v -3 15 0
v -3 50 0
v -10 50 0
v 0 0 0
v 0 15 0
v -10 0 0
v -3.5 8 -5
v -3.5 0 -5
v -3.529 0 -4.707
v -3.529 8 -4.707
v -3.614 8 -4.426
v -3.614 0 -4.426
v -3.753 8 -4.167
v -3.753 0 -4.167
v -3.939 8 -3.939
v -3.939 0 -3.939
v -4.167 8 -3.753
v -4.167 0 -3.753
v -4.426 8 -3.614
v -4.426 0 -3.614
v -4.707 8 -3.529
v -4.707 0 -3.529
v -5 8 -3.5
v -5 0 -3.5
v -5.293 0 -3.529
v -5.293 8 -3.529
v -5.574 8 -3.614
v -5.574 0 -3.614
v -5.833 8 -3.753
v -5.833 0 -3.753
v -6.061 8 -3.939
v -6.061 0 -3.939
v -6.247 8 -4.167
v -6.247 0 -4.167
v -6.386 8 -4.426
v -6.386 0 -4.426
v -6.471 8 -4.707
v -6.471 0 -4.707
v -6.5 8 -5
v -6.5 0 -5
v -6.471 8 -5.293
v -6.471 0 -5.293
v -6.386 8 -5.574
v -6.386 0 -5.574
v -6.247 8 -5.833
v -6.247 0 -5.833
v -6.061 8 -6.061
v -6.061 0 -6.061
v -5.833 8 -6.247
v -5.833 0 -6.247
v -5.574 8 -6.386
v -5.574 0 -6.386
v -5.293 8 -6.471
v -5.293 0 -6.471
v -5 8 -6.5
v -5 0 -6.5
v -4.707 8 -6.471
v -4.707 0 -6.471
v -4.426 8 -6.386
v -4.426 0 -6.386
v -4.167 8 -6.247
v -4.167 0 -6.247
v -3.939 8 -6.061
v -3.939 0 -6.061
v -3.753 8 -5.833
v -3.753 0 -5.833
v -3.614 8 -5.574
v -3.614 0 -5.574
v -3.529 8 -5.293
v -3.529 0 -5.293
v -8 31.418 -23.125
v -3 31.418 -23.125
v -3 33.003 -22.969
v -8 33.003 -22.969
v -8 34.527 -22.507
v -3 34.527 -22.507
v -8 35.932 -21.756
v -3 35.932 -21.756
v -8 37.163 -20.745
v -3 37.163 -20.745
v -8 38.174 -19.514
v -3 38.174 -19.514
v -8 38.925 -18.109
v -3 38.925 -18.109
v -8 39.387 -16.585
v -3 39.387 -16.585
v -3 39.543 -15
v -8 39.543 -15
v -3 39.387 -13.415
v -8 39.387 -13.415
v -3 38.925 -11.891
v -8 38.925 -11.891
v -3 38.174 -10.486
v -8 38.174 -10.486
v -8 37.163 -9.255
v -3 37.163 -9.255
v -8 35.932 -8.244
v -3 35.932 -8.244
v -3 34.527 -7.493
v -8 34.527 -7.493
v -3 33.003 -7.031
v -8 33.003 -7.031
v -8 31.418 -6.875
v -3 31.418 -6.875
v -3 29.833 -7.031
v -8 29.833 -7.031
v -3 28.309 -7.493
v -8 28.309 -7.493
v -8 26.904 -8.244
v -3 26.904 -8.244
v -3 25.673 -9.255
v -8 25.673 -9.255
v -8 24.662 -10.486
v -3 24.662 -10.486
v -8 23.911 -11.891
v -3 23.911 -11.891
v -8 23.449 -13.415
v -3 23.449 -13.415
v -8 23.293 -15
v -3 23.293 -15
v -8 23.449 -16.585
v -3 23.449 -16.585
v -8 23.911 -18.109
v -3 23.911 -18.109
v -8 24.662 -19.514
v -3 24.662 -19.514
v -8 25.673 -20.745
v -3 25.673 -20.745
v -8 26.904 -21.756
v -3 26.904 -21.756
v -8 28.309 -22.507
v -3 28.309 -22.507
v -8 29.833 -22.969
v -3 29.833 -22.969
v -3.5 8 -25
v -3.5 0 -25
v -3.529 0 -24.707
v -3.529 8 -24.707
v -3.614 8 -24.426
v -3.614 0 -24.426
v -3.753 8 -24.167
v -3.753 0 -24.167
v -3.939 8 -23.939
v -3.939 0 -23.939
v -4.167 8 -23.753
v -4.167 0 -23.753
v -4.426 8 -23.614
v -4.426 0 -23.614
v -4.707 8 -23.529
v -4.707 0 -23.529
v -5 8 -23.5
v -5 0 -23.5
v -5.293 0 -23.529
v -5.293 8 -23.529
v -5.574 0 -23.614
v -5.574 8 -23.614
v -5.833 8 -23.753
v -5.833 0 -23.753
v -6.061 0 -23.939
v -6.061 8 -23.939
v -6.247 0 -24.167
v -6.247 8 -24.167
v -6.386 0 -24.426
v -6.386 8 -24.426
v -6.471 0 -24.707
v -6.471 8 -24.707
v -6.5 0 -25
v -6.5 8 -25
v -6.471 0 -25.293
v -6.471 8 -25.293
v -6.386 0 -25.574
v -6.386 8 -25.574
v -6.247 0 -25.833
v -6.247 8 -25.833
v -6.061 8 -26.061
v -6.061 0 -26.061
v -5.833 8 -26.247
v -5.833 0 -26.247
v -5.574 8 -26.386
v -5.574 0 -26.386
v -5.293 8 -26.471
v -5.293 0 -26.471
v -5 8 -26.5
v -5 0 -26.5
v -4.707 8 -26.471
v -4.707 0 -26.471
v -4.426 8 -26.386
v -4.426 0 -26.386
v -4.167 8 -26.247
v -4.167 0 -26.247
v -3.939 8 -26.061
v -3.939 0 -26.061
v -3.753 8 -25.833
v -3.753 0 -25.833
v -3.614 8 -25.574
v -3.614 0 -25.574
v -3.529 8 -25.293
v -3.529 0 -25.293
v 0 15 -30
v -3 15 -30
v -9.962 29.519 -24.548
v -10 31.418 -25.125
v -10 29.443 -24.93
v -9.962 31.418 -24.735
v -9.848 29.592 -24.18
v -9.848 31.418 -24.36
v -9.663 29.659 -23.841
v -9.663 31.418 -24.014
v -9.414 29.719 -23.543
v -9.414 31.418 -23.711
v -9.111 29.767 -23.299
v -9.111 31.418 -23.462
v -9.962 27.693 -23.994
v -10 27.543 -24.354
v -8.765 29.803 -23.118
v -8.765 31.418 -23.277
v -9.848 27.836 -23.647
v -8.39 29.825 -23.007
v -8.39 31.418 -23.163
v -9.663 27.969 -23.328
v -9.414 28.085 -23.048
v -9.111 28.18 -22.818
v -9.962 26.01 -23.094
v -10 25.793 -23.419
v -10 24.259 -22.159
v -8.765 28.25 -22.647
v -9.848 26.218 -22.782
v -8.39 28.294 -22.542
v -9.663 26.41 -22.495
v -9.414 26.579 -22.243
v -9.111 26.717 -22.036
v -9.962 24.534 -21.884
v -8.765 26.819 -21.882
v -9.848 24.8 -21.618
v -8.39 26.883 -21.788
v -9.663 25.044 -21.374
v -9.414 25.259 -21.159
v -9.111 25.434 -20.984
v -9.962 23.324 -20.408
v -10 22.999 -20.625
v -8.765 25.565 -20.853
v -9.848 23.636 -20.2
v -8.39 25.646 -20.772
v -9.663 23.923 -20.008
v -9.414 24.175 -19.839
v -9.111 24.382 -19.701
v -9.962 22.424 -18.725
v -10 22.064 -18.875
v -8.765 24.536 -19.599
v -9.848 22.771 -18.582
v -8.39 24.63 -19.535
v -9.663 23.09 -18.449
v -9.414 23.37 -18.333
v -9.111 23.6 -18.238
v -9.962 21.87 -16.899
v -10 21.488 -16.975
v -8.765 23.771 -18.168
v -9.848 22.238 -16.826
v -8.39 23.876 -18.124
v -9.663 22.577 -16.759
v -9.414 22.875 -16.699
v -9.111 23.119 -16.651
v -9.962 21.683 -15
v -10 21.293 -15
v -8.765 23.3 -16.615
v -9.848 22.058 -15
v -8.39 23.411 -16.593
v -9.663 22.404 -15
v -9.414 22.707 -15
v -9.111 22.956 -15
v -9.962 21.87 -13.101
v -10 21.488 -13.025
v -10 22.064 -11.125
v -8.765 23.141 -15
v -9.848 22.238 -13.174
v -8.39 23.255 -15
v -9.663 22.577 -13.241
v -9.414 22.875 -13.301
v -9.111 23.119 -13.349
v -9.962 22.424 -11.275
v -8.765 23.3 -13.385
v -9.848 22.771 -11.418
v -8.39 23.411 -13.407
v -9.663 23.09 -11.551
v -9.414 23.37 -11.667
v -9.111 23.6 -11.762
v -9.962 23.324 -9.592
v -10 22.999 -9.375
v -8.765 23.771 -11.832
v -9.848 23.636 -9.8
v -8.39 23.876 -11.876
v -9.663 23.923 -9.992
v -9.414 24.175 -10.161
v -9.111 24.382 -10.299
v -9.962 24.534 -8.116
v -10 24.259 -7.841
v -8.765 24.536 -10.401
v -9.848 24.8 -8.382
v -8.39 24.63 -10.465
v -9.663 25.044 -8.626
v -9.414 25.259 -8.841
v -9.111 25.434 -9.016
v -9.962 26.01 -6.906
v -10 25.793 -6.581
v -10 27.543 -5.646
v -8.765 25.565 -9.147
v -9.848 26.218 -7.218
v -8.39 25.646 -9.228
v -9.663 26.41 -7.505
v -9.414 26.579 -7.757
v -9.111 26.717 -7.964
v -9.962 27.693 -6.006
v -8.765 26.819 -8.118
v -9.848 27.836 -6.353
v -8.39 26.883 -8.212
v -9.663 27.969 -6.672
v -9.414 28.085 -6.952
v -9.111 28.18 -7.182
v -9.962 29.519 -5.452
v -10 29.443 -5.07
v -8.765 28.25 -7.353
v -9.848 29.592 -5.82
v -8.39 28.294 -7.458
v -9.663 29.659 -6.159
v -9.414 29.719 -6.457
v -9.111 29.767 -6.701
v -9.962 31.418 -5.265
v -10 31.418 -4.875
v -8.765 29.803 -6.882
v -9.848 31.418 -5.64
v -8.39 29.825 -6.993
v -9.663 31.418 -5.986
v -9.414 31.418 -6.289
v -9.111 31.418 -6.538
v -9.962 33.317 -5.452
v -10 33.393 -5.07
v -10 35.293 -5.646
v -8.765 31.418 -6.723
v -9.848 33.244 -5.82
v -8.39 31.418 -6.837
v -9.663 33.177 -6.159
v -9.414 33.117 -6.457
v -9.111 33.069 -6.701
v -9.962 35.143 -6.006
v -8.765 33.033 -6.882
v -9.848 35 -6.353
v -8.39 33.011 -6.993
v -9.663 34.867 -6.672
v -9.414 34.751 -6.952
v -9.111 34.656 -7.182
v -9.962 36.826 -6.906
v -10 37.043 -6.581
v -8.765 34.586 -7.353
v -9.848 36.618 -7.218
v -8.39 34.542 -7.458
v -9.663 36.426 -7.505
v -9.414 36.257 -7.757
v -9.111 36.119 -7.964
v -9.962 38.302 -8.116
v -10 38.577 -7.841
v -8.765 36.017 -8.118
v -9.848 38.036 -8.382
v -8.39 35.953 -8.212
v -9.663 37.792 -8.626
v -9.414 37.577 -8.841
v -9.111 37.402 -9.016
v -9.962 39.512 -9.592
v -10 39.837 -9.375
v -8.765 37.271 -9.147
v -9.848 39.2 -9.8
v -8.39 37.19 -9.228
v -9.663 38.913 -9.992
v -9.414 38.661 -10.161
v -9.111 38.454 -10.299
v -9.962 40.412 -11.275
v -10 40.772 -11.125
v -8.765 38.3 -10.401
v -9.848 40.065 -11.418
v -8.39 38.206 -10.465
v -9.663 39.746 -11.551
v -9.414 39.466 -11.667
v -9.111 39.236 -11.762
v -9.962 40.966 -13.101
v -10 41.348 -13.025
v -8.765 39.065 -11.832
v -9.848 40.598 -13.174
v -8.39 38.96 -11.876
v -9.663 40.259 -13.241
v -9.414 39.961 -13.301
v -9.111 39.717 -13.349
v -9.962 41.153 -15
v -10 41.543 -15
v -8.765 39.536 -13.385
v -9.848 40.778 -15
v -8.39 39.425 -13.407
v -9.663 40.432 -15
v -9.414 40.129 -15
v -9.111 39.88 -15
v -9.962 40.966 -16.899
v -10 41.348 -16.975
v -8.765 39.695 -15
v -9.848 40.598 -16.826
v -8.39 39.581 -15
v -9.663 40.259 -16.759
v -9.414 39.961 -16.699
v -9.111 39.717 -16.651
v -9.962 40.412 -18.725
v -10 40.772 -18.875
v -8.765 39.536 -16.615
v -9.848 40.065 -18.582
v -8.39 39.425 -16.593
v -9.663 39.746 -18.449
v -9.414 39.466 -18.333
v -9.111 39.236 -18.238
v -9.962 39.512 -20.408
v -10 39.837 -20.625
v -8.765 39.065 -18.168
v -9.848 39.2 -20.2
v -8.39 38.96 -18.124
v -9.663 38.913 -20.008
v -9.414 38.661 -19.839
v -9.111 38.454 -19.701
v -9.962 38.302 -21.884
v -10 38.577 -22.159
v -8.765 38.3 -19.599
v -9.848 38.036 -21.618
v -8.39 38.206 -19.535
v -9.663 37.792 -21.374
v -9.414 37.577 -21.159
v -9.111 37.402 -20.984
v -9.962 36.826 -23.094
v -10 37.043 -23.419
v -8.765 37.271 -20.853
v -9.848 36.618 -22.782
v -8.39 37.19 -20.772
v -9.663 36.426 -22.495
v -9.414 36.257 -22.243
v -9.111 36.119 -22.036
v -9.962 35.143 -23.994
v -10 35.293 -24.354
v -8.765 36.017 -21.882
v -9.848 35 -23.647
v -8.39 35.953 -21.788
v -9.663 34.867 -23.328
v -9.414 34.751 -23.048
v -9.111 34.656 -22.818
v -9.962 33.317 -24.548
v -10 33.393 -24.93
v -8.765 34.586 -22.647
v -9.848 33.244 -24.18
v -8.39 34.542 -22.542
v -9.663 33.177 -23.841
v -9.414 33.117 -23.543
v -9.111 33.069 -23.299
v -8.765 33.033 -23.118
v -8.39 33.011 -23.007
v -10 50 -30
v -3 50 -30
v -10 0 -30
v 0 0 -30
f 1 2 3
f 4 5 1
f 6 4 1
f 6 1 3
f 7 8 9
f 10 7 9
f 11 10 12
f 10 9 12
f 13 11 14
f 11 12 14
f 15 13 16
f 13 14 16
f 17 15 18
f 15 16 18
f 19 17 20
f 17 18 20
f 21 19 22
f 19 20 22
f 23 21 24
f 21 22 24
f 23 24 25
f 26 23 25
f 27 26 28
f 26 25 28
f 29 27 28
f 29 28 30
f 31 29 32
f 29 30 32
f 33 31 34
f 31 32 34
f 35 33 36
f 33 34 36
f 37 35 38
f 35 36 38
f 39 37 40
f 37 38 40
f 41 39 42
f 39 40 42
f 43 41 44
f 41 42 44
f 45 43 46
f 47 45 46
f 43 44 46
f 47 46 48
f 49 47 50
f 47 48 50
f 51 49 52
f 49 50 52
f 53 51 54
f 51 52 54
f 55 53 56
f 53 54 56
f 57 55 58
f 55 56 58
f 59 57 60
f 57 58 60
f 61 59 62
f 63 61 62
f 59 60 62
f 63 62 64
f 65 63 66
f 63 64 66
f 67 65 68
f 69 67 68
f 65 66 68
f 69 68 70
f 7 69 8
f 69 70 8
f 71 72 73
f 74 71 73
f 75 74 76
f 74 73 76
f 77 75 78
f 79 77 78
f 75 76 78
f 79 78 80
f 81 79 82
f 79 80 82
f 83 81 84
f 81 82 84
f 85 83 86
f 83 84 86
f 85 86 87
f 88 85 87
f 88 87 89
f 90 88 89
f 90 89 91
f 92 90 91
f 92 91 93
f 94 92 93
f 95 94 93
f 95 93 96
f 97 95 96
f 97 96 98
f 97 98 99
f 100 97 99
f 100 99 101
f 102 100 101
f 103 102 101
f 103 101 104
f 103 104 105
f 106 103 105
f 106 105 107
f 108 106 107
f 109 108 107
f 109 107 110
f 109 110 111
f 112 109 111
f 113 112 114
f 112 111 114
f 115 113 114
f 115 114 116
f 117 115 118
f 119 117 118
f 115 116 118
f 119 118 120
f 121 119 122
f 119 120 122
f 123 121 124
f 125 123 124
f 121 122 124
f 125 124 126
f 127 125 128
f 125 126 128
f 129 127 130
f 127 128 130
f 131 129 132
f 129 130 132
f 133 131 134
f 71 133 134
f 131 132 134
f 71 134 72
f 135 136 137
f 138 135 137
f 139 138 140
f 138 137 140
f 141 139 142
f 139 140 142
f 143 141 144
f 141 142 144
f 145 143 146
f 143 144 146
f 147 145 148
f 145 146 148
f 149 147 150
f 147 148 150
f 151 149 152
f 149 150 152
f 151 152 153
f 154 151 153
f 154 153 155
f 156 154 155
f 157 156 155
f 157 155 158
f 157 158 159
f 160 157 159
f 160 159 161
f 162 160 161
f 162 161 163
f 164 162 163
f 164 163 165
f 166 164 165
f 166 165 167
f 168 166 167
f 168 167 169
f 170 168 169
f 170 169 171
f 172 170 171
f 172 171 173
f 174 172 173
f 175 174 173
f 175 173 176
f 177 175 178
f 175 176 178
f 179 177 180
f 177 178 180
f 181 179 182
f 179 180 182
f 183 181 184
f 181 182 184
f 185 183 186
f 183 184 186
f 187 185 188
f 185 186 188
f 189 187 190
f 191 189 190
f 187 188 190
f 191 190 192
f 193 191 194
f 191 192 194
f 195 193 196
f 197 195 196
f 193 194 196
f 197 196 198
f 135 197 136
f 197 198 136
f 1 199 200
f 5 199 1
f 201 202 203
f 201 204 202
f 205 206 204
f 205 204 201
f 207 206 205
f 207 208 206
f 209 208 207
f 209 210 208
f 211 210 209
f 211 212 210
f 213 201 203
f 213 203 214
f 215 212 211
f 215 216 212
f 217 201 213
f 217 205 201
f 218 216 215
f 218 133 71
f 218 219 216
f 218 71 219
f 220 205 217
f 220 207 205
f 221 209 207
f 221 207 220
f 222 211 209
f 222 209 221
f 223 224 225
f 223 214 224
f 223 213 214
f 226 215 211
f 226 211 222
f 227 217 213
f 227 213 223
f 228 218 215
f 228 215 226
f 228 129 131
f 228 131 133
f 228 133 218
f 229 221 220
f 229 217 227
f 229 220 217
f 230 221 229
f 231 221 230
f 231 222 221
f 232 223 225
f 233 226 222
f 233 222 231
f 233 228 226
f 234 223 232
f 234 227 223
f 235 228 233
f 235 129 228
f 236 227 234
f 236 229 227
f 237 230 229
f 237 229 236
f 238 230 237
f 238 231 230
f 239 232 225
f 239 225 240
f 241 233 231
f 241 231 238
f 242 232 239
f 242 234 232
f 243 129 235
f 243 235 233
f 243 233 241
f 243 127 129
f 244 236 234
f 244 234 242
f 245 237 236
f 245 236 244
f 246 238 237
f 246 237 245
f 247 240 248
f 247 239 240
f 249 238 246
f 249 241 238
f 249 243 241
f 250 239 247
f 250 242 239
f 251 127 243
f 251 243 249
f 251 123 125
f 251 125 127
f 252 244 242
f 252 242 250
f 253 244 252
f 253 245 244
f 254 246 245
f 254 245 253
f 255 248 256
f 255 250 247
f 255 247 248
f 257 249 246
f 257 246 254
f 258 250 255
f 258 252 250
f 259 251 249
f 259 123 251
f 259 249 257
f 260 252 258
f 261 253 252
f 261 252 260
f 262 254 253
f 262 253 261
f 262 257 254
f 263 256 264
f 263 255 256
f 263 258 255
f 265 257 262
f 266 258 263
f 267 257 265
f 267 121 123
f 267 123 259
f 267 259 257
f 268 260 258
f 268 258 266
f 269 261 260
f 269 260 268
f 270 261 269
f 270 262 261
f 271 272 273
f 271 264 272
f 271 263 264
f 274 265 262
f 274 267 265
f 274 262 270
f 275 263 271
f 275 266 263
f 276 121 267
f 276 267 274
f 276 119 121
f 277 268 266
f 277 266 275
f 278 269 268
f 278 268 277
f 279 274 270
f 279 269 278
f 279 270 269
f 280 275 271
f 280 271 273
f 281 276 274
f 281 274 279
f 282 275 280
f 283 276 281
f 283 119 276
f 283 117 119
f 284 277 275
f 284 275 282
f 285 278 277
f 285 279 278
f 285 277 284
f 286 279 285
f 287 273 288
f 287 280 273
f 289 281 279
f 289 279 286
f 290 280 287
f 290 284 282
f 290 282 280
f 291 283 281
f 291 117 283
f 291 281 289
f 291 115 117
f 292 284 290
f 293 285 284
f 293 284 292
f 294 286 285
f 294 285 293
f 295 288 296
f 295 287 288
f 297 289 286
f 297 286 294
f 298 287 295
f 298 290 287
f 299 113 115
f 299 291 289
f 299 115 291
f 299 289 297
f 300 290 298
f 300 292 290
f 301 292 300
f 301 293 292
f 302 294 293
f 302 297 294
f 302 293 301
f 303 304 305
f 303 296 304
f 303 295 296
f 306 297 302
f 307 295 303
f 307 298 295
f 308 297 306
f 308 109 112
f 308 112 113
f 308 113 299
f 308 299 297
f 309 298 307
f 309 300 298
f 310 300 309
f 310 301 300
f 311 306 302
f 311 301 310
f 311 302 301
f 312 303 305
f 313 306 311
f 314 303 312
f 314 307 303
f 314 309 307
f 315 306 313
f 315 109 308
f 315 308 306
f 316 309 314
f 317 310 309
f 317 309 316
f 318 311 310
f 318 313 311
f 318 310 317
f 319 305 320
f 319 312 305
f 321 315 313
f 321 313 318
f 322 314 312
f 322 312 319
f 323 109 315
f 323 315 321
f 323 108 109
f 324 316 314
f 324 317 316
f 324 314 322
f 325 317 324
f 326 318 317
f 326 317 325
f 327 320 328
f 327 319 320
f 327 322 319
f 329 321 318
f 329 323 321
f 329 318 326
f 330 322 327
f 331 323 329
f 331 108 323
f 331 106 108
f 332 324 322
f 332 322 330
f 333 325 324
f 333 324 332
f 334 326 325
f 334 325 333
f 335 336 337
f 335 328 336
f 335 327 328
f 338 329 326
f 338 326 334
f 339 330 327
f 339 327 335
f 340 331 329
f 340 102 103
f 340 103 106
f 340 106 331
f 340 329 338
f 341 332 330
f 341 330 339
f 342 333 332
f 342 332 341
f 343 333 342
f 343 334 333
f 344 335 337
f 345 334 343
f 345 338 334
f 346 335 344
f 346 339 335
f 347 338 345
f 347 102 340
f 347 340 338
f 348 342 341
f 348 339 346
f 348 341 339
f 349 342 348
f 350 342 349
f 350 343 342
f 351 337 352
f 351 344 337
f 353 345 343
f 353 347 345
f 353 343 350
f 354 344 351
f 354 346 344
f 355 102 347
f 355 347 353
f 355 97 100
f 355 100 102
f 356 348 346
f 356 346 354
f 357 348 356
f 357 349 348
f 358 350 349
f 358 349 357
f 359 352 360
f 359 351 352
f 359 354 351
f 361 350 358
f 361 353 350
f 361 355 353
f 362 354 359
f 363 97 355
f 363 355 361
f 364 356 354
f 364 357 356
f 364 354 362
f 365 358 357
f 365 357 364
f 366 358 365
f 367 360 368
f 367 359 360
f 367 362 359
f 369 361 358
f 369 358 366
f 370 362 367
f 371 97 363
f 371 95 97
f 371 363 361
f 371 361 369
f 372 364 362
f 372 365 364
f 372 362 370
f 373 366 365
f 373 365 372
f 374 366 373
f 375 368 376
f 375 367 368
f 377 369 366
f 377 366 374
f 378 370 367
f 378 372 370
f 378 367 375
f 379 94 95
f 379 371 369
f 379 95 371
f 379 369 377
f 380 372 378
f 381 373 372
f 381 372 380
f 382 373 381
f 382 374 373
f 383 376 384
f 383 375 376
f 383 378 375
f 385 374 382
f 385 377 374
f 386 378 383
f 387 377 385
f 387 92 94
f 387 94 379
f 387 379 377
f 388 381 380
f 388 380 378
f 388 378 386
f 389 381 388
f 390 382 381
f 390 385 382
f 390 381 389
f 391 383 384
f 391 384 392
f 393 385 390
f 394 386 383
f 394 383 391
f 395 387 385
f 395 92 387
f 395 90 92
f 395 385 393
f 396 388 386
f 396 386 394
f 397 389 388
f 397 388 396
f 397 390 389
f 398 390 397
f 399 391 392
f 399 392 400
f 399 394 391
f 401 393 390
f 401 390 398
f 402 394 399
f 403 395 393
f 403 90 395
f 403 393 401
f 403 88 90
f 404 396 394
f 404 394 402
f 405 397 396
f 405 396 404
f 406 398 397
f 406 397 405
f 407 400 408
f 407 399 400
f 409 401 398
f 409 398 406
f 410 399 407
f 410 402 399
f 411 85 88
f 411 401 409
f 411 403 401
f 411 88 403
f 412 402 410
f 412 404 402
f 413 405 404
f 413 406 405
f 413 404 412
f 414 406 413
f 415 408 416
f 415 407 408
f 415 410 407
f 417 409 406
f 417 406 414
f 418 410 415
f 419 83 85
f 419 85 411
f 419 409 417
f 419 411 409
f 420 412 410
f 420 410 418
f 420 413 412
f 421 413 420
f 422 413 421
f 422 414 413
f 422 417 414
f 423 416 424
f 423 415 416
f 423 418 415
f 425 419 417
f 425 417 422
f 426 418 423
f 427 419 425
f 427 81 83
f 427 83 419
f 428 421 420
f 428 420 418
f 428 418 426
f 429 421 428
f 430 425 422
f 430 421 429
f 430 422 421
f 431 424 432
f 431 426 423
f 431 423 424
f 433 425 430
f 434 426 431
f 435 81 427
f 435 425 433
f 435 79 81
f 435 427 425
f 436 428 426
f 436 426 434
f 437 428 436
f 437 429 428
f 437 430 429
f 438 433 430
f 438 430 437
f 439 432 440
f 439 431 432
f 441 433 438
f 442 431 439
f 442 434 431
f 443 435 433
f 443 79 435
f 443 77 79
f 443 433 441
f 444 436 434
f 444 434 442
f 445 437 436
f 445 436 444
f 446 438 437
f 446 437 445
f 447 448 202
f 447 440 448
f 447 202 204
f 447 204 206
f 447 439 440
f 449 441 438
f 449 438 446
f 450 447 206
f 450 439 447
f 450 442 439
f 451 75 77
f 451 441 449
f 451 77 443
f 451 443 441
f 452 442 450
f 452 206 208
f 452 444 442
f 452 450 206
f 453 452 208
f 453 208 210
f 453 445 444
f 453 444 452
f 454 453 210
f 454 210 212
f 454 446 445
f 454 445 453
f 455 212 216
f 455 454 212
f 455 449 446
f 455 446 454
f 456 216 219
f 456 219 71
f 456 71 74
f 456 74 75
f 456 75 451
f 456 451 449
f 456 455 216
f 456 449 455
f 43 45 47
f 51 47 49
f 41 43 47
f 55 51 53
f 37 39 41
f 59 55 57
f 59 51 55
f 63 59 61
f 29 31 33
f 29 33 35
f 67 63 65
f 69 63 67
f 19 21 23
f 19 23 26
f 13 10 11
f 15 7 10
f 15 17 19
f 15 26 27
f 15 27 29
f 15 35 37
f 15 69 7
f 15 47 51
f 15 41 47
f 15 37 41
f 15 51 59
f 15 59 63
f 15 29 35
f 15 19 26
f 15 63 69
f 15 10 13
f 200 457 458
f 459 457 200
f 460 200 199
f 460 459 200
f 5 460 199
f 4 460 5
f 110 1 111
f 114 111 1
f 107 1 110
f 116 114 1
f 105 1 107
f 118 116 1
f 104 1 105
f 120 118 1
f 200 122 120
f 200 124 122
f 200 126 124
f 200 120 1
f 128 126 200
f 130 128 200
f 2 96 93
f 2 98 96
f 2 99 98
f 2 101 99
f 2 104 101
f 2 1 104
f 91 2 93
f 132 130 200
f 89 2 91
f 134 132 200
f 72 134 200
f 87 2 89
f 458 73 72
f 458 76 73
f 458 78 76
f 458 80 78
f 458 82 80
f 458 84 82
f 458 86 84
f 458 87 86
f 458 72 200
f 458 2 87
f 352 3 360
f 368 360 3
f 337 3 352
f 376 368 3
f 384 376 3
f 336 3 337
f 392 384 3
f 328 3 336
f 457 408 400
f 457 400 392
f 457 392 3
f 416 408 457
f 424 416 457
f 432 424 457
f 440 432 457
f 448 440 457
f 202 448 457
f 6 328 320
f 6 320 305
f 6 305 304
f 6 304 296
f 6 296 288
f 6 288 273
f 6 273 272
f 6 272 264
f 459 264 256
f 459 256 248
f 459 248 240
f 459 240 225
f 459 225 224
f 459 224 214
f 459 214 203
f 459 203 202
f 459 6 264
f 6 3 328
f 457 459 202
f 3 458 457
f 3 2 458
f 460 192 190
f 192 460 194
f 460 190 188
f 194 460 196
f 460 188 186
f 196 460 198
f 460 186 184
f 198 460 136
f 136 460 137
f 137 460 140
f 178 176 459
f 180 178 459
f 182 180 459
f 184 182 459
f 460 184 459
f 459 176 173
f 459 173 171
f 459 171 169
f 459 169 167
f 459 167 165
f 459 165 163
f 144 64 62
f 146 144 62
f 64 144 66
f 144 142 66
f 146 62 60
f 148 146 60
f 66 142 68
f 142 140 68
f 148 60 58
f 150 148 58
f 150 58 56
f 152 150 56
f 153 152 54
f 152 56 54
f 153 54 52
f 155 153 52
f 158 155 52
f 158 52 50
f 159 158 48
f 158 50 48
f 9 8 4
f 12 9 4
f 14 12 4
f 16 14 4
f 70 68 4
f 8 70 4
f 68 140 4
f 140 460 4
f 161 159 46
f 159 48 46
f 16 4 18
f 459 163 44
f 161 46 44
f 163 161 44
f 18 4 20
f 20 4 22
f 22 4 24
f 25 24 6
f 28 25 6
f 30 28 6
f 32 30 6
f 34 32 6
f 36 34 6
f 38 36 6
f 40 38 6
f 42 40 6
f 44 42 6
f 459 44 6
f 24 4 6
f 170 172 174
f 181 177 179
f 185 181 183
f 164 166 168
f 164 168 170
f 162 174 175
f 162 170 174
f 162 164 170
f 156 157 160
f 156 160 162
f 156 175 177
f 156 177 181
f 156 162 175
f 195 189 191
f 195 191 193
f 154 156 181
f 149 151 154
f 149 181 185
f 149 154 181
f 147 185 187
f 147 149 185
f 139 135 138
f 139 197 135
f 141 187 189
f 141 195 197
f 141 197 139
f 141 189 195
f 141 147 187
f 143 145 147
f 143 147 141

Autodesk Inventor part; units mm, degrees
ref_plane "YZ Plane" through (0, 0, 0) normal (1, 0, 0) x (0, 1, 0)
ref_plane "XZ Plane" through (0, 0, 0) normal (0, 1, 0) x (-1, 0, 0)
ref_plane "XY Plane" through (0, 0, 0) normal (0, 0, 1) x (1, 0, 0)
sketch "Sketch1" plane through (0, 0, 0) normal (0, 1, 0) x (-1, 0, 0)
  line L0 (0, 0) -> (10, 0)
  line L1 (10, 0) -> (10, -30)
  line L2 (10, -30) -> (0, -30)
  line L3 (0, -30) -> (0, 0)
  dimension "d0" = 10
  dimension "d1" = 30
extrude "Extrusion1" add sketch "Sketch1" along normal blind 50
sketch "Sketch2" plane through (0, 0, 0) normal (0, -1, 0) x (1, 0, 0)
  line L0 (0, 0) -> (0, -30) projected
  circle A0 centre (-5, -5) radius 1.5
  circle A1 centre (-5, -25) radius 1.5
  dimension "d7" = 3
extrude "Extrusion2" cut sketch "Sketch2" against normal blind 8
sketch "Sketch3" plane through (0, 0, 0) normal (1, 0, 0) x (0, 0, -1)
  line L0 (30, 0) -> (0, 0) projected
  circle A0 centre (15, 31.418) radius 8.125
  dimension "d11" = 16.25
extrude "Extrusion3" cut sketch "Sketch3" against normal up to surface (10 mm away)
fillet "Fillet1" radius 2 2 edges at (0, 31.418, -6.875) (-10, 31.418, -6.875)
sketch "Sketch5" plane through (0, 0, 0) normal (1, 0, 0) x (0, 0, -1)
  line L0 (30, 50) -> (0, 50) projected
  line L1 (30, 0) -> (30, 50) projected
  line L2 (0, 50) -> (30, 50)
  line L3 (30, 50) -> (30, 15)
  line L4 (30, 15) -> (0, 15)
  line L5 (0, 15) -> (0, 50)
  point P0 (0, 0)
  dimension "d15" = 35
extrude "Extrusion4" cut sketch "Sketch5" against normal blind 3
properties part number "Bracket_Support"
